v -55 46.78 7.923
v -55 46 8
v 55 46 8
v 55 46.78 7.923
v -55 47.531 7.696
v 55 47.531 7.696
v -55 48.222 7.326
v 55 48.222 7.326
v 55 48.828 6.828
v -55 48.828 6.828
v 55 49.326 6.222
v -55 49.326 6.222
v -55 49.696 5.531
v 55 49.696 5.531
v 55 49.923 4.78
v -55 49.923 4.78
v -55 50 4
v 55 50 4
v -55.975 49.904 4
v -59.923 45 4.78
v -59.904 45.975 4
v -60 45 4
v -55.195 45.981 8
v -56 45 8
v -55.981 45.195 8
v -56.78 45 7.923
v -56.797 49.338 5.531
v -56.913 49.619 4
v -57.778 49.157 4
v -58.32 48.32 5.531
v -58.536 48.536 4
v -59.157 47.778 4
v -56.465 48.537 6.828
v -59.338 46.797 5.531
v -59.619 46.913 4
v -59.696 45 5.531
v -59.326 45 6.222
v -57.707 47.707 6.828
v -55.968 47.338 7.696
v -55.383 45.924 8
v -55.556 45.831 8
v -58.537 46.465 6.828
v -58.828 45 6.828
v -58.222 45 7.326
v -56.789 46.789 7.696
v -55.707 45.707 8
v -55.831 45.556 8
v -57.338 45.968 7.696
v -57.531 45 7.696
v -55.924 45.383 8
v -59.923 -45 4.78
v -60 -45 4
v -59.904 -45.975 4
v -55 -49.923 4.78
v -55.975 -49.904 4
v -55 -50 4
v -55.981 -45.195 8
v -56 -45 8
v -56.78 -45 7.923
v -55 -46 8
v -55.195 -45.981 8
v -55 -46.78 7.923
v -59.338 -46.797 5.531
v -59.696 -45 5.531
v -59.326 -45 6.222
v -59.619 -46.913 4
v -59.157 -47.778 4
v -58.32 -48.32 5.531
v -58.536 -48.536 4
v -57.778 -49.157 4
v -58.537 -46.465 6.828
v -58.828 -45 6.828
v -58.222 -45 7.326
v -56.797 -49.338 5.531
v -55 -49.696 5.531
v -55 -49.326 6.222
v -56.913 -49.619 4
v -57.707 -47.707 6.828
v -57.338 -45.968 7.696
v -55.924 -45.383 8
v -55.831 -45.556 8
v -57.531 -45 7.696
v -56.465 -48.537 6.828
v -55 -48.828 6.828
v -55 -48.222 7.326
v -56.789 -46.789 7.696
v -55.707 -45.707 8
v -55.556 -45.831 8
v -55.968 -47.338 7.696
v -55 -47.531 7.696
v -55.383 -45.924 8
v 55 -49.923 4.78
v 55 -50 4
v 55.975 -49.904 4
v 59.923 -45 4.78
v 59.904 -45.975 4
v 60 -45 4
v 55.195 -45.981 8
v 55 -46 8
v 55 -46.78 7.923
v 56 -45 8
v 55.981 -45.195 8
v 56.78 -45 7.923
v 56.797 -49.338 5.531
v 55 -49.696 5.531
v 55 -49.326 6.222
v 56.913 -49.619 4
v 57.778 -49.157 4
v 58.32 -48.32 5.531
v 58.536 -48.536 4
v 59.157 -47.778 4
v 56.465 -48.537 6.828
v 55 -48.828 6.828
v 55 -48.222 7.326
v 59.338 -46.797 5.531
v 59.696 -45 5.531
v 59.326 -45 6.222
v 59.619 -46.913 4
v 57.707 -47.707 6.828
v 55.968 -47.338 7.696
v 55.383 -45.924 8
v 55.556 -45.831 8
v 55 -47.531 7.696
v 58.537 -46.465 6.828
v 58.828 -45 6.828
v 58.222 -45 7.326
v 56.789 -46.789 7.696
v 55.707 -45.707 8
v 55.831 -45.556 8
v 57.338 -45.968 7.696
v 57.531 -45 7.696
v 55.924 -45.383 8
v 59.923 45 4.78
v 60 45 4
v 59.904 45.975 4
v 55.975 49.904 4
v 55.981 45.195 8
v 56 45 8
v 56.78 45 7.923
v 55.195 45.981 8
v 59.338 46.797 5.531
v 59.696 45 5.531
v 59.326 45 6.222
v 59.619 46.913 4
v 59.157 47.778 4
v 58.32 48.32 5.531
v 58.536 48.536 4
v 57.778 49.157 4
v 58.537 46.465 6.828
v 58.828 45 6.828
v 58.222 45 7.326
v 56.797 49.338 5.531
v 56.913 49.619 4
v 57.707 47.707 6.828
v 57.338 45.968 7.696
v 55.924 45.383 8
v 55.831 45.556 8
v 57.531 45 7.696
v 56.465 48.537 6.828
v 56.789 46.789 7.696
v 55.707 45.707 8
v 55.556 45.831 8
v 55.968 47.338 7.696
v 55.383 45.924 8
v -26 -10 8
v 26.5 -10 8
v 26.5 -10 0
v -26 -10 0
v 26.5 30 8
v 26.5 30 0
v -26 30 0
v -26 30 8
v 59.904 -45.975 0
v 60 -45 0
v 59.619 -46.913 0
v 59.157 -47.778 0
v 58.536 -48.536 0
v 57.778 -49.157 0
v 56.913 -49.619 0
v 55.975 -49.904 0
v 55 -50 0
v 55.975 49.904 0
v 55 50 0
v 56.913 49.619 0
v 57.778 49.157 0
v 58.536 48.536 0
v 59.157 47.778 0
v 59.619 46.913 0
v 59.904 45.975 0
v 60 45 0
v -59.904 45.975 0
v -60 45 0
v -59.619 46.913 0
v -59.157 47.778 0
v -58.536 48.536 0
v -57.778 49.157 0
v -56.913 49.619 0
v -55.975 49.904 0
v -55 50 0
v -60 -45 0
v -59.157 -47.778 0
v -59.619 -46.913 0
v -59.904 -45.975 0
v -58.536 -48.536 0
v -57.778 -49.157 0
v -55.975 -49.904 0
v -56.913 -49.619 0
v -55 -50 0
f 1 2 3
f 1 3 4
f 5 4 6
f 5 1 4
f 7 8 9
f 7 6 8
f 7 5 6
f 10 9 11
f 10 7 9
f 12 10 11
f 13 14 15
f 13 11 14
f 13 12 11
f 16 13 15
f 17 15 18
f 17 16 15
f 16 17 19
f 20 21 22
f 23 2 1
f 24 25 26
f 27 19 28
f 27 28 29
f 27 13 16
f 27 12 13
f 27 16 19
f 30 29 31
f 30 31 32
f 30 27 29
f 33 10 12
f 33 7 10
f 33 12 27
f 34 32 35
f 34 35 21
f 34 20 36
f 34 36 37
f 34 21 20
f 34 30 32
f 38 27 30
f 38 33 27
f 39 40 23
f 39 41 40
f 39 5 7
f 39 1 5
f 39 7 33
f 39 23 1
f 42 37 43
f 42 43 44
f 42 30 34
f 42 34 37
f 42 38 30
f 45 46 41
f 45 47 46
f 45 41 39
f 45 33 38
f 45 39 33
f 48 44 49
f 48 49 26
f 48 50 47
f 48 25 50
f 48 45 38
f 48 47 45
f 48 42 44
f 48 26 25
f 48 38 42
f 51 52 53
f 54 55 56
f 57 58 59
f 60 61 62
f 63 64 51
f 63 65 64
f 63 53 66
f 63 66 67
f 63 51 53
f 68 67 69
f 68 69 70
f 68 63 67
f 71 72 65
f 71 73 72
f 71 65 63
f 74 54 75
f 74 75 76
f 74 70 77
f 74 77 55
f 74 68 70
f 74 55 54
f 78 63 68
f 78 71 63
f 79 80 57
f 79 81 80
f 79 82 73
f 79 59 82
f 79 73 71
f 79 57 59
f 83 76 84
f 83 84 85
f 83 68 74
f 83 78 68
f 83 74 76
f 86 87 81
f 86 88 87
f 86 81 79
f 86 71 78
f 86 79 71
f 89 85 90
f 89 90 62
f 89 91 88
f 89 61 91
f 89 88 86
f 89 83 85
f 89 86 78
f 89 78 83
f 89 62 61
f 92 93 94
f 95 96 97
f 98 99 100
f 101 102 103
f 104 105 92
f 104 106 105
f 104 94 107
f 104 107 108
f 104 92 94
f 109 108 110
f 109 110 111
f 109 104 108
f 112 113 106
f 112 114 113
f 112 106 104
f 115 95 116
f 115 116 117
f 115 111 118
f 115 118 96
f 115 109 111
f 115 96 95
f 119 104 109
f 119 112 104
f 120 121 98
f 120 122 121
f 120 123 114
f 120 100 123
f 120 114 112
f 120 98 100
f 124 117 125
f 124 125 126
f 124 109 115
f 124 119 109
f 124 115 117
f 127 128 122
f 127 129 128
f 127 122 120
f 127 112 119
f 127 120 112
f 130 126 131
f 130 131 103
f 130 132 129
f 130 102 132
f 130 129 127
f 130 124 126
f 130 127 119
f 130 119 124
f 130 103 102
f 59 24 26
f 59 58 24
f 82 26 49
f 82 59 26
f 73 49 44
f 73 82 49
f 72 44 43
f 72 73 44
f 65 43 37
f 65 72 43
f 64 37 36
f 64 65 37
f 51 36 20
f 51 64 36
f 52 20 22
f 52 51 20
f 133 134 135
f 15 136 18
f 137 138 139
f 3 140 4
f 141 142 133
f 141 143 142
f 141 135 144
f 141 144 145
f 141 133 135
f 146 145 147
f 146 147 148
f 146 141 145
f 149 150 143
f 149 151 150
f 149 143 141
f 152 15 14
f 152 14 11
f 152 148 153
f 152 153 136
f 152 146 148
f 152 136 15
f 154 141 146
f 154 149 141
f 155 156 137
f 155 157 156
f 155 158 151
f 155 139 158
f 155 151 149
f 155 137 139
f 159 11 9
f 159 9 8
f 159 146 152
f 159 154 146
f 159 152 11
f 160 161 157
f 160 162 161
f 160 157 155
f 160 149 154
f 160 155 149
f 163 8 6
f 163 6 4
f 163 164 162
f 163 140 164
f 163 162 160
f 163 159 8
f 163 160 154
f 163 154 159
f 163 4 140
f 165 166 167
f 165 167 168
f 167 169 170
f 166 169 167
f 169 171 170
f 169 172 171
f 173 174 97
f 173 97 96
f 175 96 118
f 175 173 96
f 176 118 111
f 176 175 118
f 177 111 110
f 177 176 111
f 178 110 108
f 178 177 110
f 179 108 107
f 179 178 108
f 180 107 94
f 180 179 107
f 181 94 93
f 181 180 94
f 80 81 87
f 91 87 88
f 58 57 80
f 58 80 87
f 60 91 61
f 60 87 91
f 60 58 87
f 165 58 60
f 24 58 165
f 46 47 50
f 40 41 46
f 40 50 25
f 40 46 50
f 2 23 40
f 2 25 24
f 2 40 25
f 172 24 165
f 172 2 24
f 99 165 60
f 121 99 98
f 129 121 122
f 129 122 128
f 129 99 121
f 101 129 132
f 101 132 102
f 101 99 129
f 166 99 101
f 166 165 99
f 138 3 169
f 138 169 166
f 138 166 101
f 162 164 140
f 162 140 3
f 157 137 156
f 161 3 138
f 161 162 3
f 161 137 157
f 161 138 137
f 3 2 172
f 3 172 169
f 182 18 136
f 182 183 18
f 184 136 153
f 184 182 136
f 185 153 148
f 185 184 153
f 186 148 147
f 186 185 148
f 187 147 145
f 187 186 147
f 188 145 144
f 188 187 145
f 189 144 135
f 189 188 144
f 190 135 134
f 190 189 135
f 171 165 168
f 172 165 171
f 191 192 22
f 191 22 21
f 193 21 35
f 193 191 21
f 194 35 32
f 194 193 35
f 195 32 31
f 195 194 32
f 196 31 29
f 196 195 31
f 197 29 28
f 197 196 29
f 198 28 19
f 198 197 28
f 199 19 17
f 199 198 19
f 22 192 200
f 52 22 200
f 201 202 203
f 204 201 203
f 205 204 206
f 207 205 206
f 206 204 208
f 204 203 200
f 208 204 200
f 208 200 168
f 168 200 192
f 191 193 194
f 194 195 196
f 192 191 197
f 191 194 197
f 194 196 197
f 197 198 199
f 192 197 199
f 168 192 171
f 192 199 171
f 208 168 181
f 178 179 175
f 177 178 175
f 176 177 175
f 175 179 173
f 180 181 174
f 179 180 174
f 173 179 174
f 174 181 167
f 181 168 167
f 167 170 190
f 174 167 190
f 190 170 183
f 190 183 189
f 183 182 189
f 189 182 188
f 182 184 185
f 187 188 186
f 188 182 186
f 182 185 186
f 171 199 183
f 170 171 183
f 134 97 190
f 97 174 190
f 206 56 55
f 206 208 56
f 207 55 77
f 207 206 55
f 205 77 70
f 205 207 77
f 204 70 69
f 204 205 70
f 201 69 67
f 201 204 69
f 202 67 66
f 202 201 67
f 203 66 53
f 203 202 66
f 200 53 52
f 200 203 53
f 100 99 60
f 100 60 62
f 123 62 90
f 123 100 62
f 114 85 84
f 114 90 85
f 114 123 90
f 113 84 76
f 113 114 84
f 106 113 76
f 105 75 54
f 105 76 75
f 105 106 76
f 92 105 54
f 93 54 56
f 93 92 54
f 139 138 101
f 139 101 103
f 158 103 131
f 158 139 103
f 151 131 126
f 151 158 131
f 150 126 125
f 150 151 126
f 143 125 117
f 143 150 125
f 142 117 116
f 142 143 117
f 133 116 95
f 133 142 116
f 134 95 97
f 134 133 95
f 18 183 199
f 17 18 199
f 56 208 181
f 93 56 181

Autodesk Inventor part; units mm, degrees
ref_plane "YZ Plane" through (0, 0, 0) normal (1, 0, 0) x (0, 1, 0)
ref_plane "XZ Plane" through (0, 0, 0) normal (0, 1, 0) x (-1, 0, 0)
ref_plane "XY Plane" through (0, 0, 0) normal (0, 0, 1) x (1, 0, 0)
sketch "Esquisse2" plane through (0, 0, 0) normal (0, 0, 1) x (1, 0, 0)
  line L0 (-85.4497, 0) -> (85.4497, 0) construction
  line L1 (0, -71.4497) -> (0, 71.4497) construction
  line L2 (-55, -50) -> (55, -50)
  line L3 (60, -45) -> (60, 45)
  line L4 (55, 50) -> (-55, 50)
  line L5 (-60, 45) -> (-60, -45)
  line L6 (-60, -50) -> (60, 50) construction
  line L7 (60, -50) -> (-60, 50) construction
  arc A0 (-55, 50) -> (-60, 45) centre (-55, 45) ccw
  arc A1 (-60, -45) -> (-55, -50) centre (-55, -45) ccw
  arc A2 (55, -50) -> (60, -45) centre (55, -45) ccw
  arc A3 (60, 45) -> (55, 50) centre (55, 45) ccw
  point P0 (0, 0)
  dimension "d0" = 120
  dimension "d1" = 100
  dimension "d2" = 5
extrude "Extrusion1" add sketch "Esquisse2" along normal blind 8
fillet "Congé1" radius 4 8 edges at (58.5355, -48.5355, 8) (60, 0, 8) (58.5355, 48.5355, 8) (0, 50, 8) (-58.5355, 48.5355, 8) (-60, 0, 8) (-58.5355, -48.5355, 8) (0, -50, 8)
sketch "Esquisse3" plane through (0, 0, 8) normal (0, 0, 1) x (1, 0, 0)
  line L0 (-84, 0) -> (84, 0) construction
  line L1 (0, -70) -> (0, 70) construction
  line L2 (55, 50) -> (-55, 50) construction
  line L3 (-60, 45) -> (-60, -45) construction
  line L4 (-60, 50) -> (-26, 50) construction
  line L5 (-26, 50) -> (-26, 30) construction
  line L6 (-26, 30) -> (-60, 30) construction
  line L7 (-60, 30) -> (-60, 50) construction
  line L8 (-26, 30) -> (26.5, 30)
  line L9 (26.5, 30) -> (26.5, -10)
  line L10 (26.5, -10) -> (-26, -10)
  line L11 (-26, -10) -> (-26, 30)
  point P0 (0, 0)
  dimension "d6" = 34
  dimension "d7" = 20
  dimension "d8" = 52.5
  dimension "d9" = 40
extrude "Extrusion2" cut sketch "Esquisse3" against normal through all
properties part number "A2_TopCase" material "Plastique ABS"
